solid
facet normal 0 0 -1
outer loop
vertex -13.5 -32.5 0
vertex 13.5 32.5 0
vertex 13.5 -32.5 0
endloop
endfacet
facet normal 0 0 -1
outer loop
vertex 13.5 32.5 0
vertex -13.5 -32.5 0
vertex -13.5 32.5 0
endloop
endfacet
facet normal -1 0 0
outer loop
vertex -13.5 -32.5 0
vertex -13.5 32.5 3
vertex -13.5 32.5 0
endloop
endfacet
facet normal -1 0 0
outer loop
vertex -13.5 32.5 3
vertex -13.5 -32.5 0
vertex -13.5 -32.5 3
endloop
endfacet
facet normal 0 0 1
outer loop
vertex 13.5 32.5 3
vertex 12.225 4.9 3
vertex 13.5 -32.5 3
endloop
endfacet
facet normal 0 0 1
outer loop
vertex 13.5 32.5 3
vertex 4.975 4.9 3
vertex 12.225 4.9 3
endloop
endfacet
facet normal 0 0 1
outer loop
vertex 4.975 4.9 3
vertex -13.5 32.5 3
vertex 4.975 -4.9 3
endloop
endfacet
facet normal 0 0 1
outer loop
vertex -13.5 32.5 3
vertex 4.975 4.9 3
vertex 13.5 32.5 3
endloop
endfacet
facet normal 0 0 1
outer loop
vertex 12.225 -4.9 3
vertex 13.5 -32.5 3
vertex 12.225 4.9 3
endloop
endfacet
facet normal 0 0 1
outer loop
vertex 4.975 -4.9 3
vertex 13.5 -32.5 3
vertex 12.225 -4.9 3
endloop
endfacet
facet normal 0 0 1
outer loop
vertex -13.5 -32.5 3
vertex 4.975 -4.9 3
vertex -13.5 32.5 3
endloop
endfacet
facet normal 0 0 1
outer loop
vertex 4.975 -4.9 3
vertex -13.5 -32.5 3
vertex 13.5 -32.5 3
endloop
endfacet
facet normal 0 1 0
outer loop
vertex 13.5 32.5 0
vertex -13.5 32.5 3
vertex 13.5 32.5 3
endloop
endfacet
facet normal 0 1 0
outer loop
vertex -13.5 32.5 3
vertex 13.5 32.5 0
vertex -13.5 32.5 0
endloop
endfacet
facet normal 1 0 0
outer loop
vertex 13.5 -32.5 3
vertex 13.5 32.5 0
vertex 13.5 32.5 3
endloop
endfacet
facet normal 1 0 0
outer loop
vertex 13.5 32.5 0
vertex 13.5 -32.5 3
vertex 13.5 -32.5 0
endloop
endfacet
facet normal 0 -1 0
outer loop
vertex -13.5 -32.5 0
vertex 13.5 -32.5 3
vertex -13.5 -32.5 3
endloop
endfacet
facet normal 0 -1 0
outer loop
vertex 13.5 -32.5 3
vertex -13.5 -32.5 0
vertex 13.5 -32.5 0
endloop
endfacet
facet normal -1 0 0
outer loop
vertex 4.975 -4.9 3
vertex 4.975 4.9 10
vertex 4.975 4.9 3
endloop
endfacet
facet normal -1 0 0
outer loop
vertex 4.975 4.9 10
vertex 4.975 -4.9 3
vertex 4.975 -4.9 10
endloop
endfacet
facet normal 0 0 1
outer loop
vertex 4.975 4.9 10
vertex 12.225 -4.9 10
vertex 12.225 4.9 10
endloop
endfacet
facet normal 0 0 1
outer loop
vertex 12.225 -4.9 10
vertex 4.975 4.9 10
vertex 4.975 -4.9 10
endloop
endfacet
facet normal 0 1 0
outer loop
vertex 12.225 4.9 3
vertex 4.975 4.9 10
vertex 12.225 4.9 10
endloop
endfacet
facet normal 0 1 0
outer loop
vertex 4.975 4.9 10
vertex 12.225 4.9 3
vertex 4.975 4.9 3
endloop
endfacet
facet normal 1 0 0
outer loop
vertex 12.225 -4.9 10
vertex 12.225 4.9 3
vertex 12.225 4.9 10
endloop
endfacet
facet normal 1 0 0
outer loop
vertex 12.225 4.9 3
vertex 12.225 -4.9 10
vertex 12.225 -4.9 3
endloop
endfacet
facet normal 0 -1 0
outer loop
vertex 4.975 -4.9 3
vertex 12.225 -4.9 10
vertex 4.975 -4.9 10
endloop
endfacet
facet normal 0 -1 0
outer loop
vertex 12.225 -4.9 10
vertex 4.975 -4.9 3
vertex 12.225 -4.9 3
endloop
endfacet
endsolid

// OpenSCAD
// file: config.scad
HEX_WIDTH= 125;
HEX_BORDER = 7;
HEX_HEIGHT = 27;
HEX_ARM = HEX_WIDTH / 6;
SHIELD_THICKNESS = 3;

SNAPFIT_DEPTH = 12.5;
SNAPFIT_HEIGHT = 7.5;
// main file
include <config.scad>

PLATE_THICKNESS = 3;

linear_extrude(PLATE_THICKNESS)
square([HEX_HEIGHT, 65], center=true);

color("red")
translate([HEX_HEIGHT/2 - 3.4 - 1.6 + .1, 0, 0])
union() {
    linear_extrude(HEX_BORDER + PLATE_THICKNESS)
    square([8-.75, 10-.2], center=true);

    /*
    translate([.1, 0, HEX_BORDER + PLATE_THICKNESS])
    linear_extrude(1)
    square([8-.55, 10-.2], center=true);
    */
}
